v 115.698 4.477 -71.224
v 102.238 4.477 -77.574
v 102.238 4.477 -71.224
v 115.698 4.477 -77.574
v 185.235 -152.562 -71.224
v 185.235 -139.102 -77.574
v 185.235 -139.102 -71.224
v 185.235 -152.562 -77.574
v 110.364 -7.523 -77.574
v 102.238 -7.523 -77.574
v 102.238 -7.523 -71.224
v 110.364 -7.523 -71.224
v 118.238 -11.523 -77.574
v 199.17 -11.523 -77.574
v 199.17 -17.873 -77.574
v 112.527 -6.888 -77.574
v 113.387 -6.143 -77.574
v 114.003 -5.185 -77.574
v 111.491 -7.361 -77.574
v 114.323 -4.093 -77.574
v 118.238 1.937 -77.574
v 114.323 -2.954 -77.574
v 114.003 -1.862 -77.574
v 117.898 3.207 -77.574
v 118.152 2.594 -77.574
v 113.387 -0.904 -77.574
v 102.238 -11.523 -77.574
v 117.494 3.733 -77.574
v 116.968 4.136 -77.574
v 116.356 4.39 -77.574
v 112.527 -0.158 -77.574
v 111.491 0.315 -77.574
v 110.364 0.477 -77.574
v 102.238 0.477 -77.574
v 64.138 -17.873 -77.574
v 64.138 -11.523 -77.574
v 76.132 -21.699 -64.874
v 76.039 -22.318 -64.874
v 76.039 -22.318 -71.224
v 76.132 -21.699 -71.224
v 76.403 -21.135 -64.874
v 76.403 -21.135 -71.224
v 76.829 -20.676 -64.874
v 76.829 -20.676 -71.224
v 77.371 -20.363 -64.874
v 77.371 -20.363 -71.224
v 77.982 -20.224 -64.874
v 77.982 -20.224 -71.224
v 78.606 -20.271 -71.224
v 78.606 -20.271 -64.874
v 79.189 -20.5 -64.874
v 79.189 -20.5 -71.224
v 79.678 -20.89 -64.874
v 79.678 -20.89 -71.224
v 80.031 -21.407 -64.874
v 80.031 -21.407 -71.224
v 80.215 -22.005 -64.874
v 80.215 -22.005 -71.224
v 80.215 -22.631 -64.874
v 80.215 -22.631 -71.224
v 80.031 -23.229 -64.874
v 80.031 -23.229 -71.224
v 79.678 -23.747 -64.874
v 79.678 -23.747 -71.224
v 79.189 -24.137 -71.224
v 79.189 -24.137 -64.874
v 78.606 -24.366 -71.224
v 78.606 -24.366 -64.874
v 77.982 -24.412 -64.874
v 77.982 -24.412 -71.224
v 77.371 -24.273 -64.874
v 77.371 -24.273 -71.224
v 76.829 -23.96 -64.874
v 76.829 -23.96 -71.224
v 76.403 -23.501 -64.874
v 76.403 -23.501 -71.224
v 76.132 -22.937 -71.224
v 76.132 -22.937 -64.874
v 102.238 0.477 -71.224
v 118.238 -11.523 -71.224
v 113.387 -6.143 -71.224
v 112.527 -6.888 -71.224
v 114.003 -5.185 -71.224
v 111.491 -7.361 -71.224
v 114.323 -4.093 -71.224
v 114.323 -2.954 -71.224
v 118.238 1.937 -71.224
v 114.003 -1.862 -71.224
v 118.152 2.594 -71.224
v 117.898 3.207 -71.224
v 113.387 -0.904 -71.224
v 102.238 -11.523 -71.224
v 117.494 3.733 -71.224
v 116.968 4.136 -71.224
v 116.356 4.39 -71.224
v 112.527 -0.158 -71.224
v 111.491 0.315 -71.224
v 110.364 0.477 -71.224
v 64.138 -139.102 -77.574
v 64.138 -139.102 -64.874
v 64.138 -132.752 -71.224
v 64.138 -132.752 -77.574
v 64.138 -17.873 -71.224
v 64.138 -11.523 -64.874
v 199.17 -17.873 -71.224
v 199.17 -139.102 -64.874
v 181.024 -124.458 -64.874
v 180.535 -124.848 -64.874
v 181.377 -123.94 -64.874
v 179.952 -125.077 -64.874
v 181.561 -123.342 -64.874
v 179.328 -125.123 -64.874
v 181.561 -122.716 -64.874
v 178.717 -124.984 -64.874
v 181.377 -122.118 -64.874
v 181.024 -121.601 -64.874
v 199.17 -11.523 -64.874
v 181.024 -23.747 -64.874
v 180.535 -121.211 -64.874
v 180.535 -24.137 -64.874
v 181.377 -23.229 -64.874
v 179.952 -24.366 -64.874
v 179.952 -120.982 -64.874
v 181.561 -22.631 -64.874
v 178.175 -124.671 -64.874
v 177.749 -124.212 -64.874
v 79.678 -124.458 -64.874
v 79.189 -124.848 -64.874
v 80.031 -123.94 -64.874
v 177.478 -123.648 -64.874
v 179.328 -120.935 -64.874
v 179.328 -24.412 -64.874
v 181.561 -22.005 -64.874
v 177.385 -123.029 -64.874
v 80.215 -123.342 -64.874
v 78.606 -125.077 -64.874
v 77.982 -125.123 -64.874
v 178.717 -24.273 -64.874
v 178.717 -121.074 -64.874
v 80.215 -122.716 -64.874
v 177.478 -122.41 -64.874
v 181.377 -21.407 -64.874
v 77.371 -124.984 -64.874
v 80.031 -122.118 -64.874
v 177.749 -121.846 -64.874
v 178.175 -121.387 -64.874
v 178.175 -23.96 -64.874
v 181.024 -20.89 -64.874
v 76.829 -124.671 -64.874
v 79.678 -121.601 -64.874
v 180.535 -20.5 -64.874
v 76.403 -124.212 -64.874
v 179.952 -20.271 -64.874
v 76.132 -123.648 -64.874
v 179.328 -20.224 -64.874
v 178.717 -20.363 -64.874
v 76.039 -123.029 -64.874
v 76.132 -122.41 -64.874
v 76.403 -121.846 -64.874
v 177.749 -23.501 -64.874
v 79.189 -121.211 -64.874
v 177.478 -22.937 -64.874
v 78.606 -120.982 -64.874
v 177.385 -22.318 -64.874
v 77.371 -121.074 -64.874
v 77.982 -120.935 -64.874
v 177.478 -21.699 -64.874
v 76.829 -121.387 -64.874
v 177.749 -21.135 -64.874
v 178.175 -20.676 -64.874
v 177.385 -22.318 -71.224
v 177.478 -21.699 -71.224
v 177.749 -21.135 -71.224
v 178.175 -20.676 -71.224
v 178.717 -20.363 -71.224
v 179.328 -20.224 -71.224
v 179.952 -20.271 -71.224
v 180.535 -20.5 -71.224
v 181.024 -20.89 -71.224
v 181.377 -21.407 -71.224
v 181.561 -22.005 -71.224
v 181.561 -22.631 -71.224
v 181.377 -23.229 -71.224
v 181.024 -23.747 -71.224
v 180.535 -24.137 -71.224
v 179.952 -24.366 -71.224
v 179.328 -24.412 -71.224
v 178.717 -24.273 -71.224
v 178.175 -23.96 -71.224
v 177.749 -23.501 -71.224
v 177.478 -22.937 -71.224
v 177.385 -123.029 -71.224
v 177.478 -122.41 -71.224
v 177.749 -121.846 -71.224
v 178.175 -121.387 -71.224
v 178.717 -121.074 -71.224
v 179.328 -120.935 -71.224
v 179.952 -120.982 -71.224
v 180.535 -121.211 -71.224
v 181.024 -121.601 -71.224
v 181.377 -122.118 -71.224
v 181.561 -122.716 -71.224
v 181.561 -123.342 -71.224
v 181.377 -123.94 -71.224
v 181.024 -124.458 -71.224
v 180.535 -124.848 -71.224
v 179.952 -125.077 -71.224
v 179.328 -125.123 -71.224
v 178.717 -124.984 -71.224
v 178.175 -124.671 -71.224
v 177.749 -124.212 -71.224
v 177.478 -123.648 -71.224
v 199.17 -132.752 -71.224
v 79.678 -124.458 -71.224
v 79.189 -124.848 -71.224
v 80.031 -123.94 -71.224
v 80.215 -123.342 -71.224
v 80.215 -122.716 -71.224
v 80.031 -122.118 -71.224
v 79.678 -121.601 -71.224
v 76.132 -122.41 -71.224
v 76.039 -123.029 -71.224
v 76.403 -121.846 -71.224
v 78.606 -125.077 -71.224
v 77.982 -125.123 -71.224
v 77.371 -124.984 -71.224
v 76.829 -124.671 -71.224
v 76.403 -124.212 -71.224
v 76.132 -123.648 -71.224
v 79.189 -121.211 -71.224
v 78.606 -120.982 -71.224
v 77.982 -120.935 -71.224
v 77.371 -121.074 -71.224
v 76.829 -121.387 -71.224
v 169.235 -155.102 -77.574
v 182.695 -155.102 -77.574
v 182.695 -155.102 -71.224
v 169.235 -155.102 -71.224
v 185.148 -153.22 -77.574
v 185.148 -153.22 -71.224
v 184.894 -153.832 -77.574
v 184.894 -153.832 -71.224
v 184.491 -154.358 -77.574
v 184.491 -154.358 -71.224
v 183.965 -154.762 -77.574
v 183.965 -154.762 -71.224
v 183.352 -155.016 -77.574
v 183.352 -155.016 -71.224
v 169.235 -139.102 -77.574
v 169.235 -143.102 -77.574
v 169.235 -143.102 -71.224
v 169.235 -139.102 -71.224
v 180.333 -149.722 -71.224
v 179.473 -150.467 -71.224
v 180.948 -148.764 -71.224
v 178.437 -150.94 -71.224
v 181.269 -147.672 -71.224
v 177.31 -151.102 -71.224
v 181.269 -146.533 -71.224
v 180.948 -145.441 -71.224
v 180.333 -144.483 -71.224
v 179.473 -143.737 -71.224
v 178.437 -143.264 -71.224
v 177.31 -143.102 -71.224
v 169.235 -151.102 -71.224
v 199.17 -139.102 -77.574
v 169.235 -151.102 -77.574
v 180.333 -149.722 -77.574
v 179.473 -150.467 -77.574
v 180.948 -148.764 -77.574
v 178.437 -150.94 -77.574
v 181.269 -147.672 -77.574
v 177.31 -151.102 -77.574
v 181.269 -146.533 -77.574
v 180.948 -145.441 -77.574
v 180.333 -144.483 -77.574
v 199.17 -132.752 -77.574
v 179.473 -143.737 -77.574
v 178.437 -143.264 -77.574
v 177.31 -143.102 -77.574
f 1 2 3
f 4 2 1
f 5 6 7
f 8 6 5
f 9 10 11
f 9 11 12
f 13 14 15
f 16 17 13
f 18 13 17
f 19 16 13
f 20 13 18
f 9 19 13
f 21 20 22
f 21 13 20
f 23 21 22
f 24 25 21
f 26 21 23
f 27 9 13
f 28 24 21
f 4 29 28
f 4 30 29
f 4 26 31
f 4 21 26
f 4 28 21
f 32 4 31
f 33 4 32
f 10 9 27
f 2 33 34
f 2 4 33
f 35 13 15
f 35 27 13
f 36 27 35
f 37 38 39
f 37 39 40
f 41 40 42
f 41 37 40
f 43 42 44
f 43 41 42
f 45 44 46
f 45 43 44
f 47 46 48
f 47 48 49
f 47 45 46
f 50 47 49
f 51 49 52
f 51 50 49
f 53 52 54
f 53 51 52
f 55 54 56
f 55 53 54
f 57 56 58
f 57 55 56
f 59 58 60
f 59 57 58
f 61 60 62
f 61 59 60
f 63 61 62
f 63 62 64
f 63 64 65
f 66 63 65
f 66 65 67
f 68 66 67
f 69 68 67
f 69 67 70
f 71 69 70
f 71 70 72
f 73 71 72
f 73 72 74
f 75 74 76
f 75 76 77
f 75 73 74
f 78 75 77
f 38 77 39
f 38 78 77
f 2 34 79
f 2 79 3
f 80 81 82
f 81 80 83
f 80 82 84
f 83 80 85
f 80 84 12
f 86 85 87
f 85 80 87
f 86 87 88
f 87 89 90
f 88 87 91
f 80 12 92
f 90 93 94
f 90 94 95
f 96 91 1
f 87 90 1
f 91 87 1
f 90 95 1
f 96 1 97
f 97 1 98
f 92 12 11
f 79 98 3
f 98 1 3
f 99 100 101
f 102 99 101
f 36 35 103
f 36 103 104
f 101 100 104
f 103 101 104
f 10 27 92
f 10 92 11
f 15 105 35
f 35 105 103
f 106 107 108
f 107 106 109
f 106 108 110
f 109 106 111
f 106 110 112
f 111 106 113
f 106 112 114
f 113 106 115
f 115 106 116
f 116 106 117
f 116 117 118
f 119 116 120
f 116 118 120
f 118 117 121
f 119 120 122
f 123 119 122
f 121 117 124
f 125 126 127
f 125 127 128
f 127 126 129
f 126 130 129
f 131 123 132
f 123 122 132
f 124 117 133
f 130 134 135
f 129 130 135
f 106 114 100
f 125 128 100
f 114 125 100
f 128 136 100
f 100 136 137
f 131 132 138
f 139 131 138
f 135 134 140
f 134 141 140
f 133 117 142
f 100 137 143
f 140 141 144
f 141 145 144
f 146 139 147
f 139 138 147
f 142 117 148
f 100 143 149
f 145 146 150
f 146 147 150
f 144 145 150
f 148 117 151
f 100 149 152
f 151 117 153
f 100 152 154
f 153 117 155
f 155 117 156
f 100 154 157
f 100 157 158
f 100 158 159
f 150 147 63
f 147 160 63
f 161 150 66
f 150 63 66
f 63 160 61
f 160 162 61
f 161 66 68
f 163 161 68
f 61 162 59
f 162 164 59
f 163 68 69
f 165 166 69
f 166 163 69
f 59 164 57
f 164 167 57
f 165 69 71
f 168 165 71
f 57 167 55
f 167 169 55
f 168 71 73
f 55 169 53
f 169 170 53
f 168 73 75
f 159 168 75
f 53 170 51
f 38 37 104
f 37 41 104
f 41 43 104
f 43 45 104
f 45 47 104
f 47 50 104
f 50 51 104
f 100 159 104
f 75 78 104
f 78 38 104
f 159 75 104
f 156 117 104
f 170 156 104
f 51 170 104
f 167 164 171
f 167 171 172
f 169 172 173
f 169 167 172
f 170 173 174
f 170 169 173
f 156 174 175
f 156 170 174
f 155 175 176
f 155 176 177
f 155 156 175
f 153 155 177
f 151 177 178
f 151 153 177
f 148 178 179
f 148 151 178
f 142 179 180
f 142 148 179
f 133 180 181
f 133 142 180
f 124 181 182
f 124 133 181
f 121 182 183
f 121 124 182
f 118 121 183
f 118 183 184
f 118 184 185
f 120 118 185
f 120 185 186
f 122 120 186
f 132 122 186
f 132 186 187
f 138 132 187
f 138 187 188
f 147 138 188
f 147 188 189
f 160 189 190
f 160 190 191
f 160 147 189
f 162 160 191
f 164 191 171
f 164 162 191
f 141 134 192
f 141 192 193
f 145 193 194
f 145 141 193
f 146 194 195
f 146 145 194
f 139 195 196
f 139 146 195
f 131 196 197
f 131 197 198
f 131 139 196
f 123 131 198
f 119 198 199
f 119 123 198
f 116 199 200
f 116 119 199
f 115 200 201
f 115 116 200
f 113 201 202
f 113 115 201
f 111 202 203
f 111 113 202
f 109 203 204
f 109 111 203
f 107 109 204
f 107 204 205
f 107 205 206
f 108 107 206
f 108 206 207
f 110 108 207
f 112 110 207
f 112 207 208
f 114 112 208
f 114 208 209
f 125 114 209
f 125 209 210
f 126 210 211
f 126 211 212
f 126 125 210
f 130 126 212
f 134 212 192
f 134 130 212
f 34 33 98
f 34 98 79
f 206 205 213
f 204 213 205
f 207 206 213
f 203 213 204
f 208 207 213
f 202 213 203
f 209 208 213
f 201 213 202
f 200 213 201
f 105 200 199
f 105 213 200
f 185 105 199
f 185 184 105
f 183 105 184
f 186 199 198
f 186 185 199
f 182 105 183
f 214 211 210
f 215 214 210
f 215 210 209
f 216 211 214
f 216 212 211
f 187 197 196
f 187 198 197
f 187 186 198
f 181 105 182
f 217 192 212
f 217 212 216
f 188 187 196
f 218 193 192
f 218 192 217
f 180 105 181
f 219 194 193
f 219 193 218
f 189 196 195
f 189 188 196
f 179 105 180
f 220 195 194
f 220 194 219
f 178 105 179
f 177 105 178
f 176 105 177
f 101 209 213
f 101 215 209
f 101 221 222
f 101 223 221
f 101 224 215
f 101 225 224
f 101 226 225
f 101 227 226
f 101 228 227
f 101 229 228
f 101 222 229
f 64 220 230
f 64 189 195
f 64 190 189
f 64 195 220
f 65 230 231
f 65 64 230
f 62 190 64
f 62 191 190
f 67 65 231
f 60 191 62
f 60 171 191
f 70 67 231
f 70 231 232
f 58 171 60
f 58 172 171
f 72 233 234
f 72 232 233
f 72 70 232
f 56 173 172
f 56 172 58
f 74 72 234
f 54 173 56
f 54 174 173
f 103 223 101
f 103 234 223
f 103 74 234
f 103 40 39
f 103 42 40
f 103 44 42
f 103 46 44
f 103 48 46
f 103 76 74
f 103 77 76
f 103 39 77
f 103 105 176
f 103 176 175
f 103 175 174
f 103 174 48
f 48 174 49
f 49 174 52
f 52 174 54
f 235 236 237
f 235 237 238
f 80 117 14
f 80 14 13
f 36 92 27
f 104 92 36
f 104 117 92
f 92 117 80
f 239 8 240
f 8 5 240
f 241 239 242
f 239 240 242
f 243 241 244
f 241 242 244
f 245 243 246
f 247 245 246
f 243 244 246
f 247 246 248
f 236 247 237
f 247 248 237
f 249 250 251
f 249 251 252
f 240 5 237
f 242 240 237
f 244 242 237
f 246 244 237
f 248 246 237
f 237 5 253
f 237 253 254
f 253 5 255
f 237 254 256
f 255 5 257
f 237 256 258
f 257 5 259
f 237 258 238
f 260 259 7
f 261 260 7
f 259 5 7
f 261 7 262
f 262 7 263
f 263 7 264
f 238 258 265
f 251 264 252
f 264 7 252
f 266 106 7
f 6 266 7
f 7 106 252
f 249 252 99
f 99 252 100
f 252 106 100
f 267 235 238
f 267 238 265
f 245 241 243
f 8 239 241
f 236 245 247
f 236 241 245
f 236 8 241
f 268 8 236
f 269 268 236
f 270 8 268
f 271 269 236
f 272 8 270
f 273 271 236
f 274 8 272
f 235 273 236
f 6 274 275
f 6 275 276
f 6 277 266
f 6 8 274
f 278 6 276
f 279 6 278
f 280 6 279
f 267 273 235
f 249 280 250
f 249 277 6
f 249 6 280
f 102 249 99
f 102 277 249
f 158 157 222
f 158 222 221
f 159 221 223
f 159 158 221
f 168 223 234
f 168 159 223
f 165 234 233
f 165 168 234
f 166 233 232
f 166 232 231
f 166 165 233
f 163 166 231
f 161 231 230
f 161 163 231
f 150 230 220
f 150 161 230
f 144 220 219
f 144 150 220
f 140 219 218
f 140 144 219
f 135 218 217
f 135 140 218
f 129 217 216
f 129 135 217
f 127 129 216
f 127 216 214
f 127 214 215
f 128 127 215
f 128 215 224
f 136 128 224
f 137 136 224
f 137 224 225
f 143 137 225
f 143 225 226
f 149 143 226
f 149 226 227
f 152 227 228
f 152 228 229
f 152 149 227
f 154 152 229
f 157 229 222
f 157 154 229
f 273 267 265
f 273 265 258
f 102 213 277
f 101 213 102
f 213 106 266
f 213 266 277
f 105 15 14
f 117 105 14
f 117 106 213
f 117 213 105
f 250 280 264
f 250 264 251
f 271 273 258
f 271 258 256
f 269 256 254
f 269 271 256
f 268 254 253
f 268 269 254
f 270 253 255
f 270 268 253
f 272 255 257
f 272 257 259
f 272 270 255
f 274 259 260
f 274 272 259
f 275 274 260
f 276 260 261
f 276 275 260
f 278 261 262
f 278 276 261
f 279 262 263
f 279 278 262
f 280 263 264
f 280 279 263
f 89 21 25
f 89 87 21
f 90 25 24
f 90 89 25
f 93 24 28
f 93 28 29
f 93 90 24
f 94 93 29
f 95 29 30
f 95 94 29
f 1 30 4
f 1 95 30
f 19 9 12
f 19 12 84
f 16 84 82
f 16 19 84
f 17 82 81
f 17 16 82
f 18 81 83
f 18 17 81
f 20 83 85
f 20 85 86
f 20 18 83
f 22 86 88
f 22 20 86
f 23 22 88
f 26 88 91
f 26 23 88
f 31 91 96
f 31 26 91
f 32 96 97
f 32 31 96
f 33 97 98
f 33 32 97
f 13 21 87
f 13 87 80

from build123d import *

# Parameters (mm, degrees)
SKETCH1_R                = 2.1
BOSS_EXTRUDE1_DEPTH      = 6.35
BOSS_EXTRUDE2_DEPTH      = 6.35
BOSS_EXTRUDE2_DEPTH_BACK = 6.35
SKETCH4_W                = 135.031416385
SKETCH4_H                = 6.35
BOSS_EXTRUDE3_DEPTH      = 6.35
FILLET2_R                = 2.54
FILLET3_R                = 2.54


with BuildPart() as part:
    # Sketch1 → Boss-Extrude1 (new body)
    with BuildSketch(Plane(origin=(0, 0, -64.874447619), x_dir=(-1, 0, 0), z_dir=(0, 0, -1))):
        Polygon((-199.169520933, -82.051755317), (-199.169520933, -111.544482171), (-199.169520933, -132.752289105), (-64.138104548, -132.752289105), (-64.138104548, -17.873289105), (-199.169520933, -17.873289105), align=None)
        with Locations((-179.484520933, -123.029289105)):
            Circle(SKETCH1_R, mode=Mode.SUBTRACT)
        with Locations((-78.138520933, -123.029289105)):
            Circle(SKETCH1_R, mode=Mode.SUBTRACT)
        with Locations((-179.484520933, -22.318289105)):
            Circle(SKETCH1_R, mode=Mode.SUBTRACT)
        with Locations((-78.138520933, -22.318289105)):
            Circle(SKETCH1_R, mode=Mode.SUBTRACT)
    extrude(amount=BOSS_EXTRUDE1_DEPTH)

    # Sketch4 → Boss-Extrude2 (add, two sides: drawn at the far end of the back side and taken through both)
    with BuildSketch(Plane(origin=(0, 0, -71.224447619), x_dir=(-1, 0, 0), z_dir=(0, 0, -1)).offset(-BOSS_EXTRUDE2_DEPTH_BACK)):
        with Locations((-131.653812741, -14.698289105)):
            Rectangle(SKETCH4_W, SKETCH4_H)
        with Locations((-131.653812741, -135.927289105)):
            Rectangle(SKETCH4_W, SKETCH4_H)
    extrude(amount=BOSS_EXTRUDE2_DEPTH + BOSS_EXTRUDE2_DEPTH_BACK)

    # Sketch5 → Boss-Extrude3 (add)
    with BuildSketch(Plane(origin=(0, 0, -77.574447619), x_dir=(-1, 0, 0), z_dir=(0, 0, -1))):
        with BuildLine():
            Line((-118.238104548, 4.476710895), (-118.238104548, -11.523289105))
            Line((-118.238104548, -11.523289105), (-102.238104548, -11.523289105))
            Line((-102.238104548, -11.523289105), (-102.238104548, -7.523289105))
            Line((-102.238104548, -7.523289105), (-110.364104548, -7.523289105))
            ThreePointArc((-110.364104548, -7.523289105), (-114.364104548, -3.523289105), (-110.364104548, 0.476710895))
            Line((-110.364104548, 0.476710895), (-102.238104548, 0.476710895))
            Line((-102.238104548, 0.476710895), (-102.238104548, 4.476710895))
            Line((-102.238104548, 4.476710895), (-118.238104548, 4.476710895))
        make_face()
        with BuildLine():
            Line((-169.23476894, -139.102289105), (-185.23476894, -139.102289105))
            Line((-185.23476894, -139.102289105), (-185.23476894, -155.102289105))
            Line((-185.23476894, -155.102289105), (-169.23476894, -155.102289105))
            Line((-169.23476894, -155.102289105), (-169.23476894, -151.102289105))
            Line((-169.23476894, -151.102289105), (-177.30996894, -151.102289105))
            ThreePointArc((-177.30996894, -151.102289105), (-181.30996894, -147.102289105), (-177.30996894, -143.102289105))
            Line((-177.30996894, -143.102289105), (-169.23476894, -143.102289105))
            Line((-169.23476894, -143.102289105), (-169.23476894, -139.102289105))
        make_face()
    extrude(amount=-BOSS_EXTRUDE3_DEPTH)

    # Fillet2
    fillet2_edges = [part.edges().sort_by_distance(p)[0] for p in [
        (118.238104548, 4.476710895, -74.399447619),
    ]]
    fillet(fillet2_edges, radius=FILLET2_R)

    # Fillet3
    fillet3_edges = [part.edges().sort_by_distance(p)[0] for p in [
        (185.23476894, -155.102289105, -74.399447619),
    ]]
    fillet(fillet3_edges, radius=FILLET3_R)


solid = part.part
